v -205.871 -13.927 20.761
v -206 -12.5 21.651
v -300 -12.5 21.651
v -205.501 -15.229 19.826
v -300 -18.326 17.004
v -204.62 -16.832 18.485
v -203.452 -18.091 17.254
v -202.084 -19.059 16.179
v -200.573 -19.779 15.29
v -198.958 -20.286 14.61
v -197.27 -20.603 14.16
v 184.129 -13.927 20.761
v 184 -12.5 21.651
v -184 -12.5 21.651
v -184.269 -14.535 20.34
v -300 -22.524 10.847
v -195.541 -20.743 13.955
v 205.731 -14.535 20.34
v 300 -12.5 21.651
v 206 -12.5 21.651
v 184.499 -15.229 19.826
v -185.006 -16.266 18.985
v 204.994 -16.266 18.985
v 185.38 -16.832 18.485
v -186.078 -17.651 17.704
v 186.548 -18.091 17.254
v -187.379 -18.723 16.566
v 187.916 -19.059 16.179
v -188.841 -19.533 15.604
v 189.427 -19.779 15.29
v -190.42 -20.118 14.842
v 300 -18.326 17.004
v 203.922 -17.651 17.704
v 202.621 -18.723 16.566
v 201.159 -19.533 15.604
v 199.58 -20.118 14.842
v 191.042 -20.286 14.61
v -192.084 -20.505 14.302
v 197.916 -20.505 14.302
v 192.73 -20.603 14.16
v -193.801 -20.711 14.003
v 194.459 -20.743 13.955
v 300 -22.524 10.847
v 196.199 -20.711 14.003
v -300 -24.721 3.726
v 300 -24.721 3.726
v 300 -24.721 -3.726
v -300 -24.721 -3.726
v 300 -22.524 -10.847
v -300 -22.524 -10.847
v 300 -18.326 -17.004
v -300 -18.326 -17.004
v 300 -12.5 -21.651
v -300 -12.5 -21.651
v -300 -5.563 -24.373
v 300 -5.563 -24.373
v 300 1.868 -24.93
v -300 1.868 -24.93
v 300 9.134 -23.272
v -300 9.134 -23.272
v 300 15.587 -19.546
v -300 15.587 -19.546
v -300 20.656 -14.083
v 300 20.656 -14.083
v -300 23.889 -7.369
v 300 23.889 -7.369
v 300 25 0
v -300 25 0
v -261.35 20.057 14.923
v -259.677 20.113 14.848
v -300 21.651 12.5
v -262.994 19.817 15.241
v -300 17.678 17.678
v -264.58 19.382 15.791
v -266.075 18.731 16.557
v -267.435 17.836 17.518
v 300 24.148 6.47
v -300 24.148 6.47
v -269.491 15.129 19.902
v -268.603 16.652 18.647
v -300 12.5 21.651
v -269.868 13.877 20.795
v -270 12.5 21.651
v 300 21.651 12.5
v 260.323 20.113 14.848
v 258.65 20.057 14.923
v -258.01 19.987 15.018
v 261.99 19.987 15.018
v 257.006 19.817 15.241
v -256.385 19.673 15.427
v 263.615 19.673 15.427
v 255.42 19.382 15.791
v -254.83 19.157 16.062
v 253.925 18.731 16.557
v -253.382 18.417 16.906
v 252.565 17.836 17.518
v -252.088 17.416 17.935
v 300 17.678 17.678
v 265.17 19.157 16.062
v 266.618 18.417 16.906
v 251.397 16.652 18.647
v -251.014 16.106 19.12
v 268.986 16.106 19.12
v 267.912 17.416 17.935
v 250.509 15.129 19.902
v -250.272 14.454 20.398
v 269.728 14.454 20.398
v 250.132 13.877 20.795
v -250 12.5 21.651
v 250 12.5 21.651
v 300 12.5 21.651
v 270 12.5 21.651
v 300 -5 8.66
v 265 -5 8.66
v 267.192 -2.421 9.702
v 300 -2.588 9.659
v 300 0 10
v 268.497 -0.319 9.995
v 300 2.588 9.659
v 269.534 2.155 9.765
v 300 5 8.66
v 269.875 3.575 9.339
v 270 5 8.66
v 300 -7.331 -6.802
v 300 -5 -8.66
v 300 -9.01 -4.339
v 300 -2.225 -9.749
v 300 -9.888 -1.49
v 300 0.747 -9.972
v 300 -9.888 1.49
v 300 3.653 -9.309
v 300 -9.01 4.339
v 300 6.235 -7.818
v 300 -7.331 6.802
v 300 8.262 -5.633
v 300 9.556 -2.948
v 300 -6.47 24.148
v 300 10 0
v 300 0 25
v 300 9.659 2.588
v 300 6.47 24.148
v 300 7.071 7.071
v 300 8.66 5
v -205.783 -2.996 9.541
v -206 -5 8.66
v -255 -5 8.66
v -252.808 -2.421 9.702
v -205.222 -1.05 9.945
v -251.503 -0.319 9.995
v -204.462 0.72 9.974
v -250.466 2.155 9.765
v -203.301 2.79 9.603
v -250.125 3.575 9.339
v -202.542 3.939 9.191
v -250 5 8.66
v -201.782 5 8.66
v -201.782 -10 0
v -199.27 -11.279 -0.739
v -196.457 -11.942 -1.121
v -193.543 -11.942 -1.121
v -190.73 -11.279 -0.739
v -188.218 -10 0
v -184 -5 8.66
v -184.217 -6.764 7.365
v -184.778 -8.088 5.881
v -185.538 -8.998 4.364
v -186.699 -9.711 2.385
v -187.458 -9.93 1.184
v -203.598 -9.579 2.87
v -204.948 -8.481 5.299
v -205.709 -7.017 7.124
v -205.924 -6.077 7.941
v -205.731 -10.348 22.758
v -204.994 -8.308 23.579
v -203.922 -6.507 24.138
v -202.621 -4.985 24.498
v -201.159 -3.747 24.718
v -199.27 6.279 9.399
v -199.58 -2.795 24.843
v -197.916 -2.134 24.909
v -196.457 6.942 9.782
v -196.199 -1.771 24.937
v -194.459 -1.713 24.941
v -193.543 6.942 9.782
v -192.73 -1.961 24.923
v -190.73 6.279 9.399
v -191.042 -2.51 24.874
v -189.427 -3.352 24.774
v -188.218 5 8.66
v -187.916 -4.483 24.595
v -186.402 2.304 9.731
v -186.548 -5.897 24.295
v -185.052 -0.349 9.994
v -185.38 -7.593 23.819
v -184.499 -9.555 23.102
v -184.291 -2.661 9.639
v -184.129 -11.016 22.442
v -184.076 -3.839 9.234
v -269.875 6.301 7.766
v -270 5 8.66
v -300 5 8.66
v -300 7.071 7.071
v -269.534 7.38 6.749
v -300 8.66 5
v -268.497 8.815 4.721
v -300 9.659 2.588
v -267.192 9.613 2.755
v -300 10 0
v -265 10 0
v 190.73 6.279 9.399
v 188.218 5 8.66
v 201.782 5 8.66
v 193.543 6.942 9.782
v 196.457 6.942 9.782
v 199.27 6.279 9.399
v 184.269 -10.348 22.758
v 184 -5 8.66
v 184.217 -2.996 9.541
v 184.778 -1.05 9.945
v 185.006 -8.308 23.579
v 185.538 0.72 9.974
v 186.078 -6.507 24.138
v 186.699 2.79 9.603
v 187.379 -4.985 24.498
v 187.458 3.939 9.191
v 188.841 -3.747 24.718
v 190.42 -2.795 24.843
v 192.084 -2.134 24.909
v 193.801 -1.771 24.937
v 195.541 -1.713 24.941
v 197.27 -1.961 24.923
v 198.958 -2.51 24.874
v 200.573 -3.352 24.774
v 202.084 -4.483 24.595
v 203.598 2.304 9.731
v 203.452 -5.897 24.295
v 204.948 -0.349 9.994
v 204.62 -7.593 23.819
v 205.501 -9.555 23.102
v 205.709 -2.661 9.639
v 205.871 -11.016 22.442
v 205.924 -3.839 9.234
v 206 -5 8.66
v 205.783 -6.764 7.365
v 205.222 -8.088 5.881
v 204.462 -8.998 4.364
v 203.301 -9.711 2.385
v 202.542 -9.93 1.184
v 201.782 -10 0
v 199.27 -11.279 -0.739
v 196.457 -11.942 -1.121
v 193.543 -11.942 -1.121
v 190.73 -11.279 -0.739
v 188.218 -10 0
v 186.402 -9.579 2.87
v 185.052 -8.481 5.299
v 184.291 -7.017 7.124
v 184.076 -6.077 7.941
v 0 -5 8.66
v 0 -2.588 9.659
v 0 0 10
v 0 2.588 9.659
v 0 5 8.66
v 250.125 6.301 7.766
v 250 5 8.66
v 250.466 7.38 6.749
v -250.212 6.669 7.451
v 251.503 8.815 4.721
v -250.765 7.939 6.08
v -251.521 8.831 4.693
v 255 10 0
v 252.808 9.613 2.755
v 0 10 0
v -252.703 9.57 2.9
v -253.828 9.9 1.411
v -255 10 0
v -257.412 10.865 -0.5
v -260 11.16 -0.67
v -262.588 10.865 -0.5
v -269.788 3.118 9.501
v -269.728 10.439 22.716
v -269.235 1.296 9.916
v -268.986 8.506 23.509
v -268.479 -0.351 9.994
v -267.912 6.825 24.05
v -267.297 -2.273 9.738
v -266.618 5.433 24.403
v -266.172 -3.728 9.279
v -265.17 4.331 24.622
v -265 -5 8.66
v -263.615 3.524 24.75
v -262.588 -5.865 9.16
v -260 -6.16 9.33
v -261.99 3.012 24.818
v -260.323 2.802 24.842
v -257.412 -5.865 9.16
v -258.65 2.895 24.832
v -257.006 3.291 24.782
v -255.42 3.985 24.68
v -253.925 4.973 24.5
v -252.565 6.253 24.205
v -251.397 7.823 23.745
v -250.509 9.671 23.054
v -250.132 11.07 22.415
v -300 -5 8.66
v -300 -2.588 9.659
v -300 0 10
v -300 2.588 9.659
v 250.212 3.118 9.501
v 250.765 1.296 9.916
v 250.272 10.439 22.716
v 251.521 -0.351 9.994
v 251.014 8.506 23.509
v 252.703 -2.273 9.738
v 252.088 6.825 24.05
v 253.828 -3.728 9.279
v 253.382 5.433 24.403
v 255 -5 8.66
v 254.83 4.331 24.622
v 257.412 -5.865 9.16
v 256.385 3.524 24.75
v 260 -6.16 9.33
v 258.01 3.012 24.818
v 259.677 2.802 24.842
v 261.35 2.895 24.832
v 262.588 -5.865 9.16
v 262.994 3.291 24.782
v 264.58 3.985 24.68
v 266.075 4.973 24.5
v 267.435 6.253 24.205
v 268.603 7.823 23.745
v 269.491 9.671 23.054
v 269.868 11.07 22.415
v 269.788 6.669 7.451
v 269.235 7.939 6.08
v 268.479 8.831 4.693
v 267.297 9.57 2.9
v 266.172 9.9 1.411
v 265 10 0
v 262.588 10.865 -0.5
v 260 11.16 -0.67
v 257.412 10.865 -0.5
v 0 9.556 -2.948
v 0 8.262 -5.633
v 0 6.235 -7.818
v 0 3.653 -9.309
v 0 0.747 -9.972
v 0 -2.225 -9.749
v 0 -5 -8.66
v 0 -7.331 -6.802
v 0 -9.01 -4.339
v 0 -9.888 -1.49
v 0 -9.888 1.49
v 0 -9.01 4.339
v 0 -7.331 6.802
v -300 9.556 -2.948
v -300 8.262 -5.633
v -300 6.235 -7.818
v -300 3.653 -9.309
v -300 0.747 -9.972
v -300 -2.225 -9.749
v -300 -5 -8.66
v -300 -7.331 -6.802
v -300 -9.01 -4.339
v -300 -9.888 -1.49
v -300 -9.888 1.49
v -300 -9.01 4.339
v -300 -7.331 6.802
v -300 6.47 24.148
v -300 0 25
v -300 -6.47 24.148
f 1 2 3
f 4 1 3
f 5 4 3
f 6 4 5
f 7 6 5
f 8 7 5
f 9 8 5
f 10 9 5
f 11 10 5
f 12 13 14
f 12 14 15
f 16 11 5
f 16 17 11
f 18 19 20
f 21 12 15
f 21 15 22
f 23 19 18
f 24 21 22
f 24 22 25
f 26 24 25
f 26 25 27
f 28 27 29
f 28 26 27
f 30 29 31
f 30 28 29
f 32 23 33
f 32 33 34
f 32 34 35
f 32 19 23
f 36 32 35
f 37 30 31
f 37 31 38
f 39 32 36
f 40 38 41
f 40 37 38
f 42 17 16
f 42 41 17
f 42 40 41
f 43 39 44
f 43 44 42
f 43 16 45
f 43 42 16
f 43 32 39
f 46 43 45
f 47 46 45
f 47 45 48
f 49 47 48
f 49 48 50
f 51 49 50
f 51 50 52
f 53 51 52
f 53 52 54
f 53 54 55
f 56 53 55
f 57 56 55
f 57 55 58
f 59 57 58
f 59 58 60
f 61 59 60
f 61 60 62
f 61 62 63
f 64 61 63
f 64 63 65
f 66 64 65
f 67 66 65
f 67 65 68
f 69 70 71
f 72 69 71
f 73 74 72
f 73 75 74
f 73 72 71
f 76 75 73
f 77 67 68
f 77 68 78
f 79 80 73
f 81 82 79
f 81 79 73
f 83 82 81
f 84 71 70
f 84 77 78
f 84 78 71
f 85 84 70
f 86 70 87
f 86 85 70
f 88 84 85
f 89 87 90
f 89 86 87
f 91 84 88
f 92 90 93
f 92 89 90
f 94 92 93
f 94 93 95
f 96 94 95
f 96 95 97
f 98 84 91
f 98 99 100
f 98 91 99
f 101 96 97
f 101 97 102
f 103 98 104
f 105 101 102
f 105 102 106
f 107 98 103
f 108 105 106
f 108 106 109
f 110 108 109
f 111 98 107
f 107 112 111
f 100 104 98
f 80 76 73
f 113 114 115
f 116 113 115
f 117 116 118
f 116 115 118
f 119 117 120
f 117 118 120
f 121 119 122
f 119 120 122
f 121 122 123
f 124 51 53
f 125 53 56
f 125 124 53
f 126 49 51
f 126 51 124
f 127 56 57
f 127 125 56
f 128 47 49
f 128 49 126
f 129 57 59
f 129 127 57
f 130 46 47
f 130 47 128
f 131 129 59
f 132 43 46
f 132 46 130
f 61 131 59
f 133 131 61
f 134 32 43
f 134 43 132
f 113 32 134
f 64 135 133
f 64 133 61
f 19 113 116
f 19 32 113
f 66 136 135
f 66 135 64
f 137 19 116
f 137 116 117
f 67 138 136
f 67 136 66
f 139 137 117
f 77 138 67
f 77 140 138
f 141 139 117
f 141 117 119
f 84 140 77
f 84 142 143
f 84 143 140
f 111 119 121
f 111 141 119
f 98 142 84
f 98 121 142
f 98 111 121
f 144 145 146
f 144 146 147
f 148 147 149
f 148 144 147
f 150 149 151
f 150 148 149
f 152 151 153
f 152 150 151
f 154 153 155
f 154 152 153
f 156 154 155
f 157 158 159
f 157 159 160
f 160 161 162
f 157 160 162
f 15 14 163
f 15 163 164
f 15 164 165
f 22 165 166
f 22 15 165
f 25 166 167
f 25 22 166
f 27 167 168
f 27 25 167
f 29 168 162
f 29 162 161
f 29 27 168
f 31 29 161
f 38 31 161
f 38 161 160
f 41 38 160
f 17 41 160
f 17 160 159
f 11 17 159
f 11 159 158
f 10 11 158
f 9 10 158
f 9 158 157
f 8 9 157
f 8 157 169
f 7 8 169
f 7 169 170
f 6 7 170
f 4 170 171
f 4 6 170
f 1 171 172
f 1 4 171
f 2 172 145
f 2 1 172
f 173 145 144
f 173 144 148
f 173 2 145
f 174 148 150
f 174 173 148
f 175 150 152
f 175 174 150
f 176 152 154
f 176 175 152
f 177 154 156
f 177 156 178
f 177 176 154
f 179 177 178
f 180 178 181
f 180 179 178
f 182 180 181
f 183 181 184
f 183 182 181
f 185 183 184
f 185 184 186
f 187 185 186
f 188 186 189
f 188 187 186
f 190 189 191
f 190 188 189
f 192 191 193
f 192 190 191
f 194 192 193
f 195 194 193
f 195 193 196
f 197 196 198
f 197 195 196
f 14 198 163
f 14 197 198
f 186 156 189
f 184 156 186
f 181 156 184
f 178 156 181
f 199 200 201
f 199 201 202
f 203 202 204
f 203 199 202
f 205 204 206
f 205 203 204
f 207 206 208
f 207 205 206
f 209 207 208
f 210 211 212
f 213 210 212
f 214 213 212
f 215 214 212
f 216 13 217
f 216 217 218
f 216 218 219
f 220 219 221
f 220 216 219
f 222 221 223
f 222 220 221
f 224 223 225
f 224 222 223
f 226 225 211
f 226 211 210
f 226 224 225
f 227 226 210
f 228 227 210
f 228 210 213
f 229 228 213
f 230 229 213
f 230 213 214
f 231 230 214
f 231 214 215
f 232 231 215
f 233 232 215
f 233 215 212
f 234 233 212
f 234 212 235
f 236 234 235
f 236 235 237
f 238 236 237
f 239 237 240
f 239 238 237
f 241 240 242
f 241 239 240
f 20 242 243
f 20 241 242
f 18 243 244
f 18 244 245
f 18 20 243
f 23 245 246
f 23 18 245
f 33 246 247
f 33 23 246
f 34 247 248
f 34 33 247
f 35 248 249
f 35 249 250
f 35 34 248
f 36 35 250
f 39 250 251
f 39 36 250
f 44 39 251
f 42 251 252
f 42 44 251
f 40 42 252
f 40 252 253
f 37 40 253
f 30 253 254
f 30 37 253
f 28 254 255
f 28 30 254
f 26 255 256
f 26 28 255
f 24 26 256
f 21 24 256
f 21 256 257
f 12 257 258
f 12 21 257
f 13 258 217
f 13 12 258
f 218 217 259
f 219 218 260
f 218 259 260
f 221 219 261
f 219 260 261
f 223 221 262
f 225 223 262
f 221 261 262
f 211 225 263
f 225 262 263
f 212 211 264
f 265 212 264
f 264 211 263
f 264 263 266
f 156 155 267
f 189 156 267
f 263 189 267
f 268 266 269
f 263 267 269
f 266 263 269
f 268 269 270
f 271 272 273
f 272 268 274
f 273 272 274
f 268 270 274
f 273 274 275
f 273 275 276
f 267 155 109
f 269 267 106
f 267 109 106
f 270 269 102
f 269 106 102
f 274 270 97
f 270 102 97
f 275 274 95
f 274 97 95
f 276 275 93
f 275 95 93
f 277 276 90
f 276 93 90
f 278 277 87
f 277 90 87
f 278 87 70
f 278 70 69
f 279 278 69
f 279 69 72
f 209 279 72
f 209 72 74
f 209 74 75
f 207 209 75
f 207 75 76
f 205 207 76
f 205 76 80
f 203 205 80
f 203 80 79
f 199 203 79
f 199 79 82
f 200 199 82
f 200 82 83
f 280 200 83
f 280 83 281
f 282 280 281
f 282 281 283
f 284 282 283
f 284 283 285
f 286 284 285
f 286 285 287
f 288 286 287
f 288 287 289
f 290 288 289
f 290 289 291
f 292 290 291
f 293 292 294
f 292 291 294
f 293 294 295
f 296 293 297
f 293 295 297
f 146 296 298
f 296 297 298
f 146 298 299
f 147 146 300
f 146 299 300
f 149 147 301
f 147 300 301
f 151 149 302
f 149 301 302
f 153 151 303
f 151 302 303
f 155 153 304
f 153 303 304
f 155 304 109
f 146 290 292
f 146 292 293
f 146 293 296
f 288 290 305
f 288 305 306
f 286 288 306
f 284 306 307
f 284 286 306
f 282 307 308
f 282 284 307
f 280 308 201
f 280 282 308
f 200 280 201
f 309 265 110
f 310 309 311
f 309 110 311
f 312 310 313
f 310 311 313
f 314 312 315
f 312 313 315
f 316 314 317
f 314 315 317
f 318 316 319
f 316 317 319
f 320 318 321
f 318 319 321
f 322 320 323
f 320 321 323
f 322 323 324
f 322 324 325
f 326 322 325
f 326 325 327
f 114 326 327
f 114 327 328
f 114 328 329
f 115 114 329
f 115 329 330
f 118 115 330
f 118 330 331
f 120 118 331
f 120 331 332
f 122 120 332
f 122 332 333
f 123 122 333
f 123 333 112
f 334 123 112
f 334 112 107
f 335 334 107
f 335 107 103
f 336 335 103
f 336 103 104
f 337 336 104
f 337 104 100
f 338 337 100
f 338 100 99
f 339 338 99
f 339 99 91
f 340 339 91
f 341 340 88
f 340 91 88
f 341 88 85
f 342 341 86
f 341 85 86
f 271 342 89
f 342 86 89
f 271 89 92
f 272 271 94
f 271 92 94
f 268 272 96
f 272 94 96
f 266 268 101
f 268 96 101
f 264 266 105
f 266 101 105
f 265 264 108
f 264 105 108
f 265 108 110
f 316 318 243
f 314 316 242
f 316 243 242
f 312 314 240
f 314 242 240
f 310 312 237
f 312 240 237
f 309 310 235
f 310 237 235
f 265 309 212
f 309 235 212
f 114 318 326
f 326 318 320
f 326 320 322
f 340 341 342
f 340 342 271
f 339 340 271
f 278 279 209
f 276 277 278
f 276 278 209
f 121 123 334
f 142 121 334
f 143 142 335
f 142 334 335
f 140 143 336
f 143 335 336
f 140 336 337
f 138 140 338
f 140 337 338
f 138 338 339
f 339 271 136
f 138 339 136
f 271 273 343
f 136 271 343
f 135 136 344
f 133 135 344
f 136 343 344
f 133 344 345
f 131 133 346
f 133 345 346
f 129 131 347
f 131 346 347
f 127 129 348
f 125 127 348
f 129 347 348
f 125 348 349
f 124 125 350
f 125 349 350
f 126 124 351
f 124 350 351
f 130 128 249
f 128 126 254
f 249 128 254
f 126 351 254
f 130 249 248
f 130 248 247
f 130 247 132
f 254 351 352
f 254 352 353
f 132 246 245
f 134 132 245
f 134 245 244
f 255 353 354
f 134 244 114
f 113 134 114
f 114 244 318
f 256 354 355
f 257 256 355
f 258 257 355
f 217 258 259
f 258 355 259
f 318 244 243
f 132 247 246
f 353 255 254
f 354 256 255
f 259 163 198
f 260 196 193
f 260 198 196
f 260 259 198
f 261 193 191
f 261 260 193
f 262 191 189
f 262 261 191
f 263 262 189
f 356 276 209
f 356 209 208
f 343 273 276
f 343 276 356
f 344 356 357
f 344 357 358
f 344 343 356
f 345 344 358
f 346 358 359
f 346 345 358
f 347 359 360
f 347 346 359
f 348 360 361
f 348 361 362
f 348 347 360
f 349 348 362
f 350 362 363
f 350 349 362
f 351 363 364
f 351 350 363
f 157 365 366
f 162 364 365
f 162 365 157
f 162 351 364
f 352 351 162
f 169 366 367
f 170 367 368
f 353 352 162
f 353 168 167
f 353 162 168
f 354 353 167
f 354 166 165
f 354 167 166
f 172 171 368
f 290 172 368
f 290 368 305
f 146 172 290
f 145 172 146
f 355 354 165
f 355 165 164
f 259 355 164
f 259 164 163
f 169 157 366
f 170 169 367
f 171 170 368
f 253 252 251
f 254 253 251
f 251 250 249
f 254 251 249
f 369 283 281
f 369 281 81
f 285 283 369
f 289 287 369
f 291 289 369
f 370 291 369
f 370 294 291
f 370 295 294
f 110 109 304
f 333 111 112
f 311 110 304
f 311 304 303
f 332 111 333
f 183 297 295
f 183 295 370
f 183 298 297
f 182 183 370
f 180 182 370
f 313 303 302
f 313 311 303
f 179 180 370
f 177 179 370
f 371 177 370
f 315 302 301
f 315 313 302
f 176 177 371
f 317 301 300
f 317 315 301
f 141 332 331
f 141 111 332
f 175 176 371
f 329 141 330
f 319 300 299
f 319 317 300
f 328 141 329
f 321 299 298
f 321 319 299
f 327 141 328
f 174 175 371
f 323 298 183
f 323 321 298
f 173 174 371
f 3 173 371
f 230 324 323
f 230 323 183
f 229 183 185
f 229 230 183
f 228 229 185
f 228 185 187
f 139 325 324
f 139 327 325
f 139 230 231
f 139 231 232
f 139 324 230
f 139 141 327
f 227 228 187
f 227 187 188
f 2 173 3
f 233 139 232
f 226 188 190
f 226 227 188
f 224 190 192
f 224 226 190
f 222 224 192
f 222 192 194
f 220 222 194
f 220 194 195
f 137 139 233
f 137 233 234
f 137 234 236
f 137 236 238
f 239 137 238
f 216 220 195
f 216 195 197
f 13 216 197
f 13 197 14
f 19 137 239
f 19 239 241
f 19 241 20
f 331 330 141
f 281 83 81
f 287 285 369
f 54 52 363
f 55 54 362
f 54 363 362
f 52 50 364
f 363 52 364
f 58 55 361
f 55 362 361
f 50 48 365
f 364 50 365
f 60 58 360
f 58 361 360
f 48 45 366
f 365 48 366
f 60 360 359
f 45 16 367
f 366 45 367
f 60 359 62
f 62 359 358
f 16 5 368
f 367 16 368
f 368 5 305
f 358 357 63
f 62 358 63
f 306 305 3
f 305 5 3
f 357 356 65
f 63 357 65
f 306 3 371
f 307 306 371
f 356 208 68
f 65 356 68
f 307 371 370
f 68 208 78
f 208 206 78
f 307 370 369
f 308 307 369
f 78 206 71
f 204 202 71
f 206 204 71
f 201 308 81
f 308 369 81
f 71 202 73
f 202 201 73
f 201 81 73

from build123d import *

# Parameters (mm, degrees)
F1_DEPTH = 300
F3_R     = 11
F4_DEPTH = 20
F6_R     = 10
F7_DEPTH = 20


with BuildPart() as f1:
    # F0 (on Right) → F1 (new body, symmetric)
    with BuildSketch(Plane.YZ):
        with BuildLine():
            Line((5, 8.6602540378), (12.5, 21.6506350946))
            ThreePointArc((12.5, 21.6506350946), (0, 25), (-12.5, 21.6506350946))
            Line((-12.5, 21.6506350946), (-5, 8.6602540378))
            ThreePointArc((-5, 8.6602540378), (0, 10), (5, 8.6602540378))
        make_face()
        with BuildLine():
            ThreePointArc((-12.5, 21.6506350946), (-12.5, -21.6506350946), (25, 0))
            ThreePointArc((25, 0), (21.6506350946, 12.5), (12.5, 21.6506350946))
            Line((12.5, 21.6506350946), (5, 8.6602540378))
            ThreePointArc((5, 8.6602540378), (8.6602540378, 5), (10, 0))
            ThreePointArc((10, 0), (-5, -8.6602540378), (-5, 8.6602540378))
            Line((-5, 8.6602540378), (-12.5, 21.6506350946))
        make_face()
    extrude(amount=F1_DEPTH, both=True)

    # F3 (on face) → F4 (cut)
    with BuildSketch(Plane(origin=(0, -12.5, 21.6506350946), x_dir=(1, 0, 0), z_dir=(0, 0.5, -0.8660254038))):
        with BuildLine():
            ThreePointArc((206, 0), (195, 11), (184, 0))
            ThreePointArc((184, 0), (195, -11), (206, 0))
        make_face()
        with Locations((-195, 0)):
            Circle(F3_R)
    extrude(amount=F4_DEPTH, mode=Mode.SUBTRACT)

    # F6 (on face) → F7 (cut)
    with BuildSketch(Plane(origin=(0, 12.5, 21.6506350946), x_dir=(1, 0, 0), z_dir=(0, 0.5, 0.8660254038))):
        with BuildLine():
            ThreePointArc((270, 0), (260, 10), (250, 0))
            ThreePointArc((250, 0), (260, -10), (270, 0))
        make_face()
        with Locations((-260, 0)):
            Circle(F6_R)
    extrude(amount=-F7_DEPTH, mode=Mode.SUBTRACT)


solid = f1.part
